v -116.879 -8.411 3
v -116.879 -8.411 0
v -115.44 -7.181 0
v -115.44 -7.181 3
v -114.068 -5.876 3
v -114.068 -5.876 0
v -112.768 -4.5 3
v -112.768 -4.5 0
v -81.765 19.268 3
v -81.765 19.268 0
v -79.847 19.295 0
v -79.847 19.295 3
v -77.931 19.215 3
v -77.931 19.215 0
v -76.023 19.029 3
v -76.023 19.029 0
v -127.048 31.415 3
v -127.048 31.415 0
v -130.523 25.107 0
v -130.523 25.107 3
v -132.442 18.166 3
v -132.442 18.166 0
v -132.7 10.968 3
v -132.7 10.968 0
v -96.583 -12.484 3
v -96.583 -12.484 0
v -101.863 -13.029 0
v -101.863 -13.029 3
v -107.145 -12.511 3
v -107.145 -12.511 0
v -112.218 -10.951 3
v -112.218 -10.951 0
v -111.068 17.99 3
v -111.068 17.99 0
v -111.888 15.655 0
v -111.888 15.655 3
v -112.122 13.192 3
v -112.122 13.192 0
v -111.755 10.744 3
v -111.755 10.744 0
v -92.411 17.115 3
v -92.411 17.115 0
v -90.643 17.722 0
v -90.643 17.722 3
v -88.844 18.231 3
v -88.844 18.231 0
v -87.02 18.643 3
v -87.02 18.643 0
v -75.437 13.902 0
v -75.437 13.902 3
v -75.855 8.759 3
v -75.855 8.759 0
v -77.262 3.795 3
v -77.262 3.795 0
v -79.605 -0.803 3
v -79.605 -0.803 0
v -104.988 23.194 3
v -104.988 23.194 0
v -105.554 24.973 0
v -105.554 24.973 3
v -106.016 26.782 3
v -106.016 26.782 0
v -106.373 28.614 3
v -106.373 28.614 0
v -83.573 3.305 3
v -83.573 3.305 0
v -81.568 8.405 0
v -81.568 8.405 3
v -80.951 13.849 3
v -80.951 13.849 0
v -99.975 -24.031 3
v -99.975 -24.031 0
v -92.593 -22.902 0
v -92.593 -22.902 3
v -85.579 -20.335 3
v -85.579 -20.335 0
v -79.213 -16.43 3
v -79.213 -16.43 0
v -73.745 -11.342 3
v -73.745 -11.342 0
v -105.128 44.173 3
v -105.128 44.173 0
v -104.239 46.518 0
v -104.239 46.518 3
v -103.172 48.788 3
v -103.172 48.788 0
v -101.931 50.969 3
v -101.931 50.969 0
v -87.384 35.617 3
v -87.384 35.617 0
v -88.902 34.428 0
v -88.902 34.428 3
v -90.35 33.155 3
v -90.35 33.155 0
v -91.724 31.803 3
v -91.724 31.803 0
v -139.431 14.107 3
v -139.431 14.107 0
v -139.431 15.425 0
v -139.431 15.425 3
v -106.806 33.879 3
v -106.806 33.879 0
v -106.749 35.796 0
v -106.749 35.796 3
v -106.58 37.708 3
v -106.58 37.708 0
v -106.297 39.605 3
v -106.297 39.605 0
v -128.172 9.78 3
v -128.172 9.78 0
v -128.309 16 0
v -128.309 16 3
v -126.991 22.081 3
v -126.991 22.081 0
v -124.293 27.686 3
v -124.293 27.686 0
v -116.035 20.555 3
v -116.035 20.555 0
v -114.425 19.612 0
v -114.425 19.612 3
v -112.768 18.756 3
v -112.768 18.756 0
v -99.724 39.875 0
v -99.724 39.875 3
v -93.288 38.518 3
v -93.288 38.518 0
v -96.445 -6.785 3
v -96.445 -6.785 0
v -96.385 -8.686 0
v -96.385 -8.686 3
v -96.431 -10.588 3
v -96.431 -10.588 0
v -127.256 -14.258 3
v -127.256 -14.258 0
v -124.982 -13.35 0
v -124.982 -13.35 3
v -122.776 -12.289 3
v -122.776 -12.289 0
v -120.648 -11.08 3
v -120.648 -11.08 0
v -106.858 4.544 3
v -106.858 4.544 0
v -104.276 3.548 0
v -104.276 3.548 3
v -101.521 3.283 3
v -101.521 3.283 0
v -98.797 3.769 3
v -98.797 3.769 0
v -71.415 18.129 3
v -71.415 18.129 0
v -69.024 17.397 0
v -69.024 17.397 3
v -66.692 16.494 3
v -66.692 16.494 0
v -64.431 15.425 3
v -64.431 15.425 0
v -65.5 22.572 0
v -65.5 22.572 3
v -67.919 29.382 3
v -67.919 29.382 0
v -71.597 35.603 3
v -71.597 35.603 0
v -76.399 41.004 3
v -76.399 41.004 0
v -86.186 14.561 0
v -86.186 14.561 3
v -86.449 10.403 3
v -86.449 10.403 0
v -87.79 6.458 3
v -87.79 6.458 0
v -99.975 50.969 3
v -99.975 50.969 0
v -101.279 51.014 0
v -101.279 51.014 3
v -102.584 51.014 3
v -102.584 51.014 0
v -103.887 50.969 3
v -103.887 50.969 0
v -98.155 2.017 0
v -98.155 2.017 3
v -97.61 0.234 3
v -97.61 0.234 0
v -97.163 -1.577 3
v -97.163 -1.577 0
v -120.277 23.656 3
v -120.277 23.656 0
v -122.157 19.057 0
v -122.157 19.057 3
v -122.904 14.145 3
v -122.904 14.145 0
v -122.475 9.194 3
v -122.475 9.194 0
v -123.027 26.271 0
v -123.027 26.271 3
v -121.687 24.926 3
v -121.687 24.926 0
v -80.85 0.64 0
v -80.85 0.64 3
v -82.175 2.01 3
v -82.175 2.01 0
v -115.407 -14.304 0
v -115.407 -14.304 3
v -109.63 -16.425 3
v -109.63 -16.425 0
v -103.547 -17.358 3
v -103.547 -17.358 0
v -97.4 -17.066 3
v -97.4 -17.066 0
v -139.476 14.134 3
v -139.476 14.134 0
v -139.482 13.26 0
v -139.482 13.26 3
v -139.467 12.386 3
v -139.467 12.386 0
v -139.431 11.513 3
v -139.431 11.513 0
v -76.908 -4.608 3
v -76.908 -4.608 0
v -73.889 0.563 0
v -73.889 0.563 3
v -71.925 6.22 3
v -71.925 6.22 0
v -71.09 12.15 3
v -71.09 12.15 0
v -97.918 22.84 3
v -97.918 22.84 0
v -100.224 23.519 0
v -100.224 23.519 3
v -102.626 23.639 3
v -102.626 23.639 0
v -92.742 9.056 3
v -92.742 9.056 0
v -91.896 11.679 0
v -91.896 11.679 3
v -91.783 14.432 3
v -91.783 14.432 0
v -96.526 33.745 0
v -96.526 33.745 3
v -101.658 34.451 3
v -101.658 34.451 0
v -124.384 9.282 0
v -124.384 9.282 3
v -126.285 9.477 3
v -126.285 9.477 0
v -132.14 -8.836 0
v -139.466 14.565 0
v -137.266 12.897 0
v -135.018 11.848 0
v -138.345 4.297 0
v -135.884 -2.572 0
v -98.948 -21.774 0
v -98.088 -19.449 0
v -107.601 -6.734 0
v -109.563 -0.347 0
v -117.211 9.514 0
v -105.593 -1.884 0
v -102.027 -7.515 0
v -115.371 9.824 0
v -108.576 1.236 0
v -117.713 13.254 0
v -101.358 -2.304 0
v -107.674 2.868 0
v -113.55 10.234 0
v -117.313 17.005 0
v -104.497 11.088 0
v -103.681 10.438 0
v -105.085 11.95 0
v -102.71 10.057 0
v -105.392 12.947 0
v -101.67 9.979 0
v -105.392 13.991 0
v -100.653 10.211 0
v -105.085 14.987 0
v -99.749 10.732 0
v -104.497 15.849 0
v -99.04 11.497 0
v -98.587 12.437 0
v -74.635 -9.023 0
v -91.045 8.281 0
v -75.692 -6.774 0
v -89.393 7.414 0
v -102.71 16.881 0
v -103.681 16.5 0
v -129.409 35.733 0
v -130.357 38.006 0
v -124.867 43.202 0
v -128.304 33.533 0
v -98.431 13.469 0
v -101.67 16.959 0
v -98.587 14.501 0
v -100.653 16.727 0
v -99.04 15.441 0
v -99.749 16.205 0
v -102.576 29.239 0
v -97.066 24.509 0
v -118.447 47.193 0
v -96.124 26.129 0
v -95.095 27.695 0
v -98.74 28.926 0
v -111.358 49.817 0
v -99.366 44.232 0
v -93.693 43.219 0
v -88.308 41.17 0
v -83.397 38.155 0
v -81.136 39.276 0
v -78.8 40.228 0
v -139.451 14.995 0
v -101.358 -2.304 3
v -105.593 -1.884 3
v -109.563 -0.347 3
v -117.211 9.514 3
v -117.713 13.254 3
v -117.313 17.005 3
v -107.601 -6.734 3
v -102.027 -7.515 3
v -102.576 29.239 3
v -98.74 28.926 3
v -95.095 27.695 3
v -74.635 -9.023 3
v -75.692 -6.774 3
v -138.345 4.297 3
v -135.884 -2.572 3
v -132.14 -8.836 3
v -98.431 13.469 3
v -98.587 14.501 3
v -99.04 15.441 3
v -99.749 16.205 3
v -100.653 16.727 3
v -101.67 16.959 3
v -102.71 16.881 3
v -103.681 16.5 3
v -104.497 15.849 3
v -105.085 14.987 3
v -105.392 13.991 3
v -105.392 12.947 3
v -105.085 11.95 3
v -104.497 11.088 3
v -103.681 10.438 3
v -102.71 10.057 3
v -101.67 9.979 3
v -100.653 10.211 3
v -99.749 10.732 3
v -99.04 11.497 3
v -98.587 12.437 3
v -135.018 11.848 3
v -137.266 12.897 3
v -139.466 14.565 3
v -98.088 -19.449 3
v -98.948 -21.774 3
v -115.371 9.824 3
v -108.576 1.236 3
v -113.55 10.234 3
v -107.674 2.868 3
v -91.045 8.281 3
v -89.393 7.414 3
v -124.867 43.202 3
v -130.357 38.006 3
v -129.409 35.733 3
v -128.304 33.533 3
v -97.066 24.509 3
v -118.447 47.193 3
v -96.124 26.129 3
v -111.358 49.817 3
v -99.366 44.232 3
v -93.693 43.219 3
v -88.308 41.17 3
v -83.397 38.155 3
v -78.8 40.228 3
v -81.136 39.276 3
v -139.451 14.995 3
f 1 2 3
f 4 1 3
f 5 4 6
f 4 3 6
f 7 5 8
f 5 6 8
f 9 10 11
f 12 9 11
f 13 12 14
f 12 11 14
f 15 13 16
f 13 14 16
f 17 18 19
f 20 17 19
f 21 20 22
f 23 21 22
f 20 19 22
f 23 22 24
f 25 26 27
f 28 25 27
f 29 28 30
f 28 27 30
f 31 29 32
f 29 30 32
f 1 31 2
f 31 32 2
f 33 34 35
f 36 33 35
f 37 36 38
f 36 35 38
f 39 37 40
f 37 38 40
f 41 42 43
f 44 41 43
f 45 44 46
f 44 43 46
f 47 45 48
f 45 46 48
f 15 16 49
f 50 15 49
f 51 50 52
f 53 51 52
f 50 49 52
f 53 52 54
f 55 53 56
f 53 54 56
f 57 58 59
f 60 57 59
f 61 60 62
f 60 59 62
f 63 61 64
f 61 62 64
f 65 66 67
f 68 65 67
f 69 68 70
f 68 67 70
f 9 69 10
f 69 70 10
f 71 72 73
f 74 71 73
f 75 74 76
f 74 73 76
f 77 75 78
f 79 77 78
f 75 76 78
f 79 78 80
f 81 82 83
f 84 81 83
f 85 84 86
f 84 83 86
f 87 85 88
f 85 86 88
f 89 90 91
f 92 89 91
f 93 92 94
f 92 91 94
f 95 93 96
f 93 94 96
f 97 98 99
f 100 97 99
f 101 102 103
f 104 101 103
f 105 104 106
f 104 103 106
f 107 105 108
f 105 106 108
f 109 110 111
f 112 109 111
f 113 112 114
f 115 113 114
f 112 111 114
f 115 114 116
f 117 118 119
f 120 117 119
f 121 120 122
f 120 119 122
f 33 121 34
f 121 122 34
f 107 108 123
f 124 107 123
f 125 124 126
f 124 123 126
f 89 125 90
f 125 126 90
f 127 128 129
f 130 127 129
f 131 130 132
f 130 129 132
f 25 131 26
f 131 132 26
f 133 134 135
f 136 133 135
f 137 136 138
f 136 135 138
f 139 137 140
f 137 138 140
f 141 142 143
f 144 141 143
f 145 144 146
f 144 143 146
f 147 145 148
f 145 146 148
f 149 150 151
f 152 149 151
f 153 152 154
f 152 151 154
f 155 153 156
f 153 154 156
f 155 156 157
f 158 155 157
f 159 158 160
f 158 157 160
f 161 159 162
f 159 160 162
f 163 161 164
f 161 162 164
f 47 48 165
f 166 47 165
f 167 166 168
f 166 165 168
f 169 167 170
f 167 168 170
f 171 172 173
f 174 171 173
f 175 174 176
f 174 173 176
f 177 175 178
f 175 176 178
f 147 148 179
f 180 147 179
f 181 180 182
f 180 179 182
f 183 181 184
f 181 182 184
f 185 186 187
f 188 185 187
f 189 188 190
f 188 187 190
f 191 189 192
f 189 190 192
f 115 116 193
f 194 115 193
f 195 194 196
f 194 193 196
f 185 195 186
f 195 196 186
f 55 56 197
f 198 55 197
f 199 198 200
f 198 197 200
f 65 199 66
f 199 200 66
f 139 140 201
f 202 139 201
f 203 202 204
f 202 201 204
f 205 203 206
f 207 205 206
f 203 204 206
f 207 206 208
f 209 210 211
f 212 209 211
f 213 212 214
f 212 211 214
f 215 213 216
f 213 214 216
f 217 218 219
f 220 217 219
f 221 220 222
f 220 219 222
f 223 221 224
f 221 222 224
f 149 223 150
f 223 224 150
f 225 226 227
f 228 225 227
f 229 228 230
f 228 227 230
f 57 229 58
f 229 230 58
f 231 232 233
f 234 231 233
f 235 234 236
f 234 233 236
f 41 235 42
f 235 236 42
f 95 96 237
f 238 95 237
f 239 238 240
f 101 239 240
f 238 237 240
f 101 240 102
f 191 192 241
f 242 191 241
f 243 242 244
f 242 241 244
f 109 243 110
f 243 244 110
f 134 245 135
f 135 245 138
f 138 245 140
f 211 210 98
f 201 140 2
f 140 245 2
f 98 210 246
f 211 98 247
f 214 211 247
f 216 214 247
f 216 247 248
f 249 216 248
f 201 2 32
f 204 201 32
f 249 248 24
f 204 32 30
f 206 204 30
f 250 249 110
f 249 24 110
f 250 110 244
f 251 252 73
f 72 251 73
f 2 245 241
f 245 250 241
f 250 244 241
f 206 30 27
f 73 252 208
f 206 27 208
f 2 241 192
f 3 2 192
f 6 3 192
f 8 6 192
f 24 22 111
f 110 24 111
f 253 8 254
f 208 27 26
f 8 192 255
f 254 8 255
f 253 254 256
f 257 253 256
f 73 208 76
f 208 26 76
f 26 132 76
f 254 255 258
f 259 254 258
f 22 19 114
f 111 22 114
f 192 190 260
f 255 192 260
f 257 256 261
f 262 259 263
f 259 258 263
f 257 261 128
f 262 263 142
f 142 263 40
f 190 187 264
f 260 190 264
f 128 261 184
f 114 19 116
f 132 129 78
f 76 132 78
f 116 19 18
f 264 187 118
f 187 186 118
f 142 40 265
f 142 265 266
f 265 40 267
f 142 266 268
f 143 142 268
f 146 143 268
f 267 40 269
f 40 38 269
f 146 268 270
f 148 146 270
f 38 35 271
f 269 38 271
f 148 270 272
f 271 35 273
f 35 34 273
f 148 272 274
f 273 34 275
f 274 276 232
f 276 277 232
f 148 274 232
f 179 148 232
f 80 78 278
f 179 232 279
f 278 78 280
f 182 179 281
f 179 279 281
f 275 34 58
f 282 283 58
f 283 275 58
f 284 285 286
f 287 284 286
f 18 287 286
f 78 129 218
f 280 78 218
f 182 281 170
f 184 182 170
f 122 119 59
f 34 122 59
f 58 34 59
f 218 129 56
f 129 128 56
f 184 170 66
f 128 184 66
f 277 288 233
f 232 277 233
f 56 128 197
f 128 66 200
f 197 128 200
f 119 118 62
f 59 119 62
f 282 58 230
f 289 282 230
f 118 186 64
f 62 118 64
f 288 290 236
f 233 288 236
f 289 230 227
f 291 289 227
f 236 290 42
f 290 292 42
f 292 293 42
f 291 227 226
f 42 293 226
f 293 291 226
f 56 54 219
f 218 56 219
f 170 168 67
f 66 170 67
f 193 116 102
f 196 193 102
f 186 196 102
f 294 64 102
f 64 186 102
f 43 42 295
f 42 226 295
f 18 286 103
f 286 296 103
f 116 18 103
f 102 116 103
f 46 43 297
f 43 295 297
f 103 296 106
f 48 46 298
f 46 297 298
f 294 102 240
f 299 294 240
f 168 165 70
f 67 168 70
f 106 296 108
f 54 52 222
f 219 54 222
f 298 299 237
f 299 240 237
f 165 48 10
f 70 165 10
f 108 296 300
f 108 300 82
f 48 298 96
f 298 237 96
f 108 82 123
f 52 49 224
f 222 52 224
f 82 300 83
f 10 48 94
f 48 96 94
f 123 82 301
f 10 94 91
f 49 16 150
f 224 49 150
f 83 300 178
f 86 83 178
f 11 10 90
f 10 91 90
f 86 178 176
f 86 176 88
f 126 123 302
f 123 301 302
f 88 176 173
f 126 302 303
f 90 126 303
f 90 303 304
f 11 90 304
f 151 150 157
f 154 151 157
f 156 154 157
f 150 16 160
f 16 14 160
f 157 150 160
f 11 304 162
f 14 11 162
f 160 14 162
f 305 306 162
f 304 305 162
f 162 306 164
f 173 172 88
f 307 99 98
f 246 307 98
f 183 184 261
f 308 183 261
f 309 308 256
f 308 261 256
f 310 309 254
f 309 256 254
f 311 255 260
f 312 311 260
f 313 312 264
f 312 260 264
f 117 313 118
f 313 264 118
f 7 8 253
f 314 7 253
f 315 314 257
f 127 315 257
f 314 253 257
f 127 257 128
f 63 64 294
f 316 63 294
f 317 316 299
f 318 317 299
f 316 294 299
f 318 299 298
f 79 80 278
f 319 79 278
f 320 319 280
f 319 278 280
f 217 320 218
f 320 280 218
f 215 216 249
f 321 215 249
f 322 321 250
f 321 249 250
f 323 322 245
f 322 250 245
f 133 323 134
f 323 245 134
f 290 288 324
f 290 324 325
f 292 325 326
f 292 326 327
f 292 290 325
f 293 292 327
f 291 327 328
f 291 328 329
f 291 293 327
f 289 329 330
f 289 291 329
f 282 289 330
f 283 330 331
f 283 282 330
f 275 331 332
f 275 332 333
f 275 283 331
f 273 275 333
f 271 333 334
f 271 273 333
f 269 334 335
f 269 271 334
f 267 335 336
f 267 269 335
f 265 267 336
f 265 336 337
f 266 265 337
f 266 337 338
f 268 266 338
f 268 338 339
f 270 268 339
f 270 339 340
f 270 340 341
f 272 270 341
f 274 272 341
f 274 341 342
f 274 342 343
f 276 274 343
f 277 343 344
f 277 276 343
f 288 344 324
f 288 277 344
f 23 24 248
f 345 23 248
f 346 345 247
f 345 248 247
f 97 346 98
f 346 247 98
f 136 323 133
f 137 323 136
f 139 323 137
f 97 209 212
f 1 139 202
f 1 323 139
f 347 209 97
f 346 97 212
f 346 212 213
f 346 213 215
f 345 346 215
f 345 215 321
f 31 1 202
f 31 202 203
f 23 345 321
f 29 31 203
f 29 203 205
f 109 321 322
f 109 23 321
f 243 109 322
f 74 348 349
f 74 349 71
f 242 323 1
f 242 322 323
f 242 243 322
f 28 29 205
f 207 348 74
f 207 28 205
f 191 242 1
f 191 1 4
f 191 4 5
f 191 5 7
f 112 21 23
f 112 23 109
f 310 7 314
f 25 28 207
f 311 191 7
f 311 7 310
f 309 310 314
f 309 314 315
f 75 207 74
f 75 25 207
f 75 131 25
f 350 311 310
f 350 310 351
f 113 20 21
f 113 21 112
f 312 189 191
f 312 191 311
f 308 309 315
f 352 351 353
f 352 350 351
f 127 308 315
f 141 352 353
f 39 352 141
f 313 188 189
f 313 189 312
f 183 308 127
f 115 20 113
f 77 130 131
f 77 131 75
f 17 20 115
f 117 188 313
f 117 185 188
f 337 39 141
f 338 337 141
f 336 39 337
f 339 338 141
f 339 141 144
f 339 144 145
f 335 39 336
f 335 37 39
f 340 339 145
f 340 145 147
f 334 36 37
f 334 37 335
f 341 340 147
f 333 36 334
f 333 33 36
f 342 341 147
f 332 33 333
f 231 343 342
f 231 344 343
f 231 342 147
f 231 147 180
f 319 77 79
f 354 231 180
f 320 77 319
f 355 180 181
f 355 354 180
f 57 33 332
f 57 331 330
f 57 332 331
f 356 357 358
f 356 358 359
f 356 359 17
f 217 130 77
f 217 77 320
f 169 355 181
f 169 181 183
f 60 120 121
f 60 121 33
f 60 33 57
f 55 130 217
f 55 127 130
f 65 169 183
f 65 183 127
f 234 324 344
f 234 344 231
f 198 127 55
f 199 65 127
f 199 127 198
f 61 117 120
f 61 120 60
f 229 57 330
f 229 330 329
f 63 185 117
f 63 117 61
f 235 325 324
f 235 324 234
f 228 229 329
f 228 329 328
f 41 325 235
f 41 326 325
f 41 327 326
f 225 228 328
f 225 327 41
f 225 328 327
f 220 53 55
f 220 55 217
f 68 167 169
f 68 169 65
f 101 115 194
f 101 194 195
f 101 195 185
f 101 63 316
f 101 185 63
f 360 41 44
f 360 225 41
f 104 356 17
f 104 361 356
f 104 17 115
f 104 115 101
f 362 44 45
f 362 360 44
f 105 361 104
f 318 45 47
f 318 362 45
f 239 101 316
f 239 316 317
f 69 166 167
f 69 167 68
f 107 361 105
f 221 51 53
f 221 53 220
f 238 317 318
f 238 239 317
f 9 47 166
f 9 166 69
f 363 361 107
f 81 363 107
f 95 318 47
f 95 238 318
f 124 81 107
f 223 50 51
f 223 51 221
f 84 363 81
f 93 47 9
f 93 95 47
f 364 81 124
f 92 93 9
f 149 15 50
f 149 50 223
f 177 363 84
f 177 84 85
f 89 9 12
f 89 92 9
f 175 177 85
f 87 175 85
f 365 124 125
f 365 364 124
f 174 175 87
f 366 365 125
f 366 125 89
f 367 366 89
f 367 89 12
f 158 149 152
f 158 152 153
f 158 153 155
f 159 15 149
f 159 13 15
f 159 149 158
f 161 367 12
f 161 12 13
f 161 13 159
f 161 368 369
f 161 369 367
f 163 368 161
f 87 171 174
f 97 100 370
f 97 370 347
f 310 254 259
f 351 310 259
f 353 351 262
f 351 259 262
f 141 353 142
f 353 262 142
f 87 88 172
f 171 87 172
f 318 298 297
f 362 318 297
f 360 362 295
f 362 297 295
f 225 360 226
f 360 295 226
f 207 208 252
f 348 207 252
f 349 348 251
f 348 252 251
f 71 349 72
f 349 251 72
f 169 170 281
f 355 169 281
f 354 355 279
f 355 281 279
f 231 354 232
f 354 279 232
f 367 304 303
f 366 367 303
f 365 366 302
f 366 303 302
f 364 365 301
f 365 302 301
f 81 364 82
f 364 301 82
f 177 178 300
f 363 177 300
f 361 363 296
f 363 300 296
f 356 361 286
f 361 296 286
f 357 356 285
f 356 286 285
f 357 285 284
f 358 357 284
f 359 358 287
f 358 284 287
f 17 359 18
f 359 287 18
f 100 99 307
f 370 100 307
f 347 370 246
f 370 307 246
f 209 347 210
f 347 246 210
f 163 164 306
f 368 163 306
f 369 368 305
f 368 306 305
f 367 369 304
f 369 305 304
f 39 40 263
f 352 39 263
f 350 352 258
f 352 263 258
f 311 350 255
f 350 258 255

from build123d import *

# Parameters (mm, degrees)
F0_R     = 3.5
F1_DEPTH = 3


# Not quite as in the source:
# - a feature names something its author has since deleted; it is built from what else it names


with BuildPart() as f1:
    # F0 (on Top) → F1 (new body)
    with BuildSketch(Plane.XY):
        with BuildLine():
            Line((-103.8872403759, 50.9688953831), (-101.9313409925, 50.9688953831))
            Line((-101.9313409925, 50.9688953831), (-99.975441609, 50.9688953831))
            ThreePointArc((-99.975441609, 50.9688953831), (-101.9313409925, 51.0198679723), (-103.8872403759, 50.9688953831))
        make_face()
        with BuildLine():
            ThreePointArc((-105.128088395, 44.1726214205), (-103.7275117352, 47.6637957311), (-101.9313409925, 50.9688953831))
            Line((-101.9313409925, 50.9688953831), (-103.8872403759, 50.9688953831))
            ThreePointArc((-103.8872403759, 50.9688953831), (-118.4470490216, 47.1928769199), (-130.3569155648, 38.005852257))
            ThreePointArc((-130.3569155648, 38.005852257), (-128.876069776, 34.6235055457), (-127.0483694881, 31.4152840472))
            ThreePointArc((-127.0483694881, 31.4152840472), (-131.6855143995, 21.6924682926), (-132.6995872702, 10.9682939496))
            ThreePointArc((-132.6995872702, 10.9682939496), (-136.152020588, 12.3518590173), (-139.4313409925, 14.1067395817))
            Line((-139.4313409925, 14.1067395817), (-139.4313409925, 11.5129959997))
            ThreePointArc((-139.4313409925, 11.5129959997), (-135.8835245013, -2.5724504886), (-127.2555101816, -14.2576622337))
            ThreePointArc((-127.2555101816, -14.2576622337), (-123.8698155437, -12.8388675837), (-120.6478658456, -11.079621557))
            ThreePointArc((-120.6478658456, -11.079621557), (-109.6296820224, -16.4254775309), (-97.3998915176, -17.0663948921))
            ThreePointArc((-97.3998915176, -17.0663948921), (-98.4971319541, -20.6192094649), (-99.975441609, -24.0311046169))
            ThreePointArc((-99.975441609, -24.0311046169), (-85.5790985856, -20.3346504467), (-73.7446837693, -11.342148468))
            ThreePointArc((-73.7446837693, -11.342148468), (-75.1429207557, -7.8890051383), (-76.9083449574, -4.6083736574))
            ThreePointArc((-76.9083449574, -4.6083736574), (-71.9248057865, 6.2200450283), (-71.4154696243, 18.1293225284))
            ThreePointArc((-71.4154696243, 18.1293225284), (-67.8499010769, 16.9668747828), (-64.4313409925, 15.4247947665))
            ThreePointArc((-64.4313409925, 15.4247947665), (-67.9189218222, 29.3821252434), (-76.3988312093, 41.0037185452))
            ThreePointArc((-76.3988312093, 41.0037185452), (-79.9768515125, 39.773669955), (-83.3966724505, 38.1550058214))
            ThreePointArc((-83.3966724505, 38.1550058214), (-93.6932659385, 43.219056827), (-105.128088395, 44.1726214205))
        make_face()
        with BuildLine():
            ThreePointArc((-116.8786483854, -8.4112257418), (-114.7452282061, -6.5377141597), (-112.7675725108, -4.500459816))
            ThreePointArc((-112.7675725108, -4.500459816), (-104.8400955118, -7.312365092), (-96.445234408, -6.785098651))
            ThreePointArc((-96.445234408, -6.785098651), (-96.3945126034, -9.6374635235), (-96.5828731928, -12.4840541783))
            ThreePointArc((-96.5828731928, -12.4840541783), (-107.144920689, -12.5114873217), (-116.8786483854, -8.4112257418))
        make_face(mode=Mode.SUBTRACT)
        with BuildLine():
            ThreePointArc((-97.1633932868, -1.5770140117), (-103.489663028, -2.237292801), (-109.5628503108, -0.3467761664))
            ThreePointArc((-109.5628503108, -0.3467761664), (-108.1146014235, 2.0457215346), (-106.8582364184, 4.544324557))
            ThreePointArc((-106.8582364184, 4.544324557), (-102.9079011749, 3.321551239), (-98.7968737544, 3.768515076))
            ThreePointArc((-98.7968737544, 3.768515076), (-97.870198127, 1.1293444599), (-97.1633932868, -1.5770140117))
        make_face(mode=Mode.SUBTRACT)
        with BuildLine():
            ThreePointArc((-87.020290304, 18.643185886), (-86.1794714129, 12.4732450474), (-87.7904785909, 6.4582801904))
            ThreePointArc((-87.7904785909, 6.4582801904), (-90.2129680661, 7.8584356684), (-92.7417733998, 9.0559473403))
            ThreePointArc((-92.7417733998, 9.0559473403), (-91.7456646982, 13.0514491022), (-92.4114813686, 17.1150626462))
            ThreePointArc((-92.4114813686, 17.1150626462), (-89.7469190596, 17.9886089148), (-87.020290304, 18.643185886))
        make_face(mode=Mode.SUBTRACT)
        with BuildLine():
            ThreePointArc((-79.6045613776, -0.8026360965), (-81.5030217359, 1.3342277264), (-83.5732367524, 3.3051535278))
            ThreePointArc((-83.5732367524, 3.3051535278), (-81.0808826805, 11.1066871006), (-81.7647527708, 19.2680642275))
            ThreePointArc((-81.7647527708, 19.2680642275), (-78.8888619154, 19.2681720991), (-76.0229262651, 19.0290882807))
            ThreePointArc((-76.0229262651, 19.0290882807), (-75.8548608571, 8.7594492912), (-79.6045613776, -0.8026360965))
        make_face(mode=Mode.SUBTRACT)
        with BuildLine():
            ThreePointArc((-124.2925325258, 27.6864483354), (-122.366283457, 25.5897237243), (-120.2765526126, 23.655889562))
            ThreePointArc((-120.2765526126, 23.655889562), (-122.6767843834, 16.6229750116), (-122.4752234892, 9.1944911263))
            ThreePointArc((-122.4752234892, 9.1944911263), (-125.3358583127, 9.3662040749), (-128.1716299117, 9.7798662184))
            ThreePointArc((-128.1716299117, 9.7798662184), (-127.8289740179, 19.0790916737), (-124.2925325258, 27.6864483354))
        make_face(mode=Mode.SUBTRACT)
        with BuildLine():
            ThreePointArc((-116.0346336158, 20.5547864365), (-113.602585651, 19.1733015065), (-111.068333377, 17.9896954377))
            ThreePointArc((-111.068333377, 17.9896954377), (-112.0801205218, 14.4304238708), (-111.7547699117, 10.7444675099))
            ThreePointArc((-111.7547699117, 10.7444675099), (-114.4574555109, 10.0161737122), (-117.2111759917, 9.514232662))
            ThreePointArc((-117.2111759917, 9.514232662), (-117.6257828154, 15.1413817681), (-116.0346336158, 20.5547864365))
        make_face(mode=Mode.SUBTRACT)
        with Locations((-101.9313409925, 13.4688953831)):
            Circle(F0_R, mode=Mode.SUBTRACT)
        with BuildLine():
            ThreePointArc((-106.3733358176, 28.6142377963), (-100.6487081208, 29.1999973076), (-95.0945804167, 27.6946262842))
            ThreePointArc((-95.0945804167, 27.6946262842), (-96.6062830352, 25.3254140346), (-97.9178620412, 22.8398211472))
            ThreePointArc((-97.9178620412, 22.8398211472), (-101.4213565394, 23.6503578923), (-104.988310348, 23.1939764279))
            ThreePointArc((-104.988310348, 23.1939764279), (-105.7981495503, 25.8741269811), (-106.3733358176, 28.6142377963))
        make_face(mode=Mode.SUBTRACT)
        with BuildLine():
            ThreePointArc((-87.3838790757, 35.6168761154), (-89.634828263, 33.8018778137), (-91.7240079261, 31.8027981717))
            ThreePointArc((-91.7240079261, 31.8027981717), (-99.0699795968, 34.2567343942), (-106.8057550879, 33.8787392584))
            ThreePointArc((-106.8057550879, 33.8787392584), (-106.6786212529, 36.7532837824), (-106.296701705, 39.6051790629))
            ThreePointArc((-106.296701705, 39.6051790629), (-96.4636690625, 39.3969933158), (-87.3838790757, 35.6168761154))
        make_face(mode=Mode.SUBTRACT)
        with BuildLine():
            Line((-139.4313409925, 14.1067395817), (-139.4313409925, 15.4247947665))
            ThreePointArc((-139.4313409925, 15.4247947665), (-139.4594284478, 14.7796945074), (-139.4764192758, 14.1342066599))
            ThreePointArc((-139.4764192758, 14.1342066599), (-139.4538855016, 14.1204643119), (-139.4313409925, 14.1067395817))
        make_face()
        with BuildLine():
            Line((-139.4313409925, 11.5129959997), (-139.4313409925, 14.1067395817))
            ThreePointArc((-139.4313409925, 14.1067395817), (-139.4538855016, 14.1204643119), (-139.4764192758, 14.1342066599))
            ThreePointArc((-139.4764192758, 14.1342066599), (-139.4767618846, 12.8232078208), (-139.4313409925, 11.5129959997))
        make_face()
    extrude(amount=F1_DEPTH)


solid = f1.part
